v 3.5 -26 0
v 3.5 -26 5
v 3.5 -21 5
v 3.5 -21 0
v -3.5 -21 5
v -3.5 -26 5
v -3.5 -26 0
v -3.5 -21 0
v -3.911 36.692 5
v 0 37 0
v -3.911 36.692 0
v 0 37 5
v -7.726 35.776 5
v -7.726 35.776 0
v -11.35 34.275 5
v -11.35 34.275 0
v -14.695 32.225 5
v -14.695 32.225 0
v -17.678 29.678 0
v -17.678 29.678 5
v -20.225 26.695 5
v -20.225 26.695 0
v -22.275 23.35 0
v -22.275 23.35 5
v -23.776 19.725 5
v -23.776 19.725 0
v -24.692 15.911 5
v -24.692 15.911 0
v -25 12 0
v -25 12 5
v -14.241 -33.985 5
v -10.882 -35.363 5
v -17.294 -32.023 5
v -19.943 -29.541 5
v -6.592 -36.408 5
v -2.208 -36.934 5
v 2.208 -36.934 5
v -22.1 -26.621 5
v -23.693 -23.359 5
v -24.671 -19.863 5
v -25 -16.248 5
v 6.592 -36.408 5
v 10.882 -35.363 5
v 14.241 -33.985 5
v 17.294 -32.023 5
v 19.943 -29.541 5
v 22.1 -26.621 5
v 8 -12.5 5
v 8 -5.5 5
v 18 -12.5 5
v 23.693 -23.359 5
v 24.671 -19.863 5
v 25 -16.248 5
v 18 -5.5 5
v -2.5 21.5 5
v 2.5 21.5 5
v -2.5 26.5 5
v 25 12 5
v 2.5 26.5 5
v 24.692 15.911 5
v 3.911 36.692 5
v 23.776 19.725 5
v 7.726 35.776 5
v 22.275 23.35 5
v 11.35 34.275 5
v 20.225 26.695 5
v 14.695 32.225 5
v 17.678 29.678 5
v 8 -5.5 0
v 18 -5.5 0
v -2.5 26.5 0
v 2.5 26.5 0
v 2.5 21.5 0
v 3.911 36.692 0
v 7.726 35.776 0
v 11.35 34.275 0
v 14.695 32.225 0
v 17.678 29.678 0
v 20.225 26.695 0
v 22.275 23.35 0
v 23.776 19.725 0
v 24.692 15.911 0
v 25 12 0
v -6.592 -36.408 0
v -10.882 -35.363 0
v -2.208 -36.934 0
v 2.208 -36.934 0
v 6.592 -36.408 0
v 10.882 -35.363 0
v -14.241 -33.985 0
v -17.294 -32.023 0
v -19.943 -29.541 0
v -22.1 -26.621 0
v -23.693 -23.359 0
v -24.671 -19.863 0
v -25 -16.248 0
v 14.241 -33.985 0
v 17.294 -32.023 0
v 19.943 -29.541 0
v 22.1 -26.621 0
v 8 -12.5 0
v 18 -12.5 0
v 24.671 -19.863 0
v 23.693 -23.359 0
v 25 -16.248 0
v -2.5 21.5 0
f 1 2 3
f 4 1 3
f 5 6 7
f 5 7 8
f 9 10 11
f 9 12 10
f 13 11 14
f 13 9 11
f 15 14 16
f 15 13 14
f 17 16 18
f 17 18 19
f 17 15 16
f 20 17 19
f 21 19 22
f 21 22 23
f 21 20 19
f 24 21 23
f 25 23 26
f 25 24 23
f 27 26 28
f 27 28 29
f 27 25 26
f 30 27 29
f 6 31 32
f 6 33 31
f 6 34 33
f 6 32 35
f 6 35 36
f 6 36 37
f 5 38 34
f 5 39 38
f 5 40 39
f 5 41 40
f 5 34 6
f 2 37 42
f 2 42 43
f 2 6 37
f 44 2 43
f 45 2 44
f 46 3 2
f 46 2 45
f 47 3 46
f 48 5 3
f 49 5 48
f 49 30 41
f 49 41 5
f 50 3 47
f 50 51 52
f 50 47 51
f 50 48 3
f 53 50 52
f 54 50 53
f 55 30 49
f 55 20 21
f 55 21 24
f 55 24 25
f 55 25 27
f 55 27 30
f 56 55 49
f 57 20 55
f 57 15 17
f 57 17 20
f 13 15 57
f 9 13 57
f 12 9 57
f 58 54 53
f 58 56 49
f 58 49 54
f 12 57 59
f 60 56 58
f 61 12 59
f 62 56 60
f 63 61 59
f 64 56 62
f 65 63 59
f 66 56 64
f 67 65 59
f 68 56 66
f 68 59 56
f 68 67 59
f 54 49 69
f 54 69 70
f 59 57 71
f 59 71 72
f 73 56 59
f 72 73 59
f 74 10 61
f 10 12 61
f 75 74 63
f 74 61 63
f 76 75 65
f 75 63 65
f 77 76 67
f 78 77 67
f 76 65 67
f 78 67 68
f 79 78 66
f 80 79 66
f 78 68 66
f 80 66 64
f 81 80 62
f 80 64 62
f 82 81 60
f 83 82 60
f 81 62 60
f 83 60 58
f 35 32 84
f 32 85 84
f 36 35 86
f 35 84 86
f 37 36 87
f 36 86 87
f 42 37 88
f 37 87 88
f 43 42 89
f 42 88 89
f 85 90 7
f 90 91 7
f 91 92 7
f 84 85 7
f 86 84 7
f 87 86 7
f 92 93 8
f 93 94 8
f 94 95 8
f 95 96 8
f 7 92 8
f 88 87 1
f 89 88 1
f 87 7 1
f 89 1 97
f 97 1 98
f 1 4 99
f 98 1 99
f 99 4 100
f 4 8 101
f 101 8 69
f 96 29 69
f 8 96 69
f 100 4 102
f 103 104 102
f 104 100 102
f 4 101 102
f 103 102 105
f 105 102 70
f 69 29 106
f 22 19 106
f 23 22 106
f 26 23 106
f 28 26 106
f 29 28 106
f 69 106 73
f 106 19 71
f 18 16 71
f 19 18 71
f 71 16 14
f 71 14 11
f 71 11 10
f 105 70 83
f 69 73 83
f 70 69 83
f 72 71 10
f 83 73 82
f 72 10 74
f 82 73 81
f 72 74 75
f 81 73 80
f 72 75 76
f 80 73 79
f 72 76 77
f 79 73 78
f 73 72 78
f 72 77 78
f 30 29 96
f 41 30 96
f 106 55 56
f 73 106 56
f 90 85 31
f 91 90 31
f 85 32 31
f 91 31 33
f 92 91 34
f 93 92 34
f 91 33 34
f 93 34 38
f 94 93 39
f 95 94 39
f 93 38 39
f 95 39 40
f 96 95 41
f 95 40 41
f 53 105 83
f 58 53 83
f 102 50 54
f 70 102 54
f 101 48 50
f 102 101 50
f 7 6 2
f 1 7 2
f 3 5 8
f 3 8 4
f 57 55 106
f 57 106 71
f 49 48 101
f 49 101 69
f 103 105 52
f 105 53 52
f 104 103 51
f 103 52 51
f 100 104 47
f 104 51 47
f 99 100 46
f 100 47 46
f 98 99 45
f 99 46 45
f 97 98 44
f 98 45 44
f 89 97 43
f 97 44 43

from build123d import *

# Parameters (mm, degrees)
SKETCH1_R           = 37
BOSS_EXTRUDE1_DEPTH = 5
CUT_EXTRUDE3_START  = -10
CUT_EXTRUDE3_DEPTH  = 10
FILLET2_R           = 25
FILLET3_R           = 20
SKETCH7_W           = 5
SKETCH7_H           = 5
SKETCH7_W_2         = 7
CUT_EXTRUDE4_DEPTH  = 10
SKETCH8_W           = 10
SKETCH8_H           = 7
CUT_EXTRUDE5_DEPTH  = 10


with BuildPart() as part:
    # Sketch1 → Boss-Extrude1 (new body)
    with BuildSketch(Plane.XY):
        Circle(SKETCH1_R)
    extrude(amount=BOSS_EXTRUDE1_DEPTH)

    # Sketch6 → Cut-Extrude3 (cut)
    with BuildSketch(Plane.XY.offset(5).offset(CUT_EXTRUDE3_START)):
        with BuildLine():
            Line((-25, 27.276363394), (-25, -27.276363394))
            ThreePointArc((-25, -27.276363394), (-37, 0), (-25, 27.276363394))
        make_face()
        with BuildLine():
            Line((25, -27.276363394), (25, 27.276363394))
            ThreePointArc((25, 27.276363394), (37, 0), (25, -27.276363394))
        make_face()
    extrude(amount=CUT_EXTRUDE3_DEPTH, mode=Mode.SUBTRACT)

    # Fillet2
    fillet2_edges = [part.edges().sort_by_distance(p)[0] for p in [
        (-25, 27.276363394, 2.5),
        (25, 27.276363394, 2.5),
    ]]
    fillet(fillet2_edges, radius=FILLET2_R - 0.0001)  # a hair under: the kernel refuses the full size

    # Fillet3
    fillet3_edges = [part.edges().sort_by_distance(p)[0] for p in [
        (-25, -27.276363394, 2.5),
        (25, -27.276363394, 2.5),
    ]]
    fillet(fillet3_edges, radius=FILLET3_R)

    # Sketch7 → Cut-Extrude4 (cut)
    with BuildSketch(Plane.XY.offset(5)):
        with Locations((0, 24)):
            Rectangle(SKETCH7_W, SKETCH7_H)
        with Locations((0, -23.5)):
            Rectangle(SKETCH7_W_2, SKETCH7_H)
    extrude(amount=-CUT_EXTRUDE4_DEPTH, mode=Mode.SUBTRACT)

    # Sketch8 → Cut-Extrude5 (cut)
    with BuildSketch(Plane.XY.offset(5)):
        with Locations((13, -9)):
            Rectangle(SKETCH8_W, SKETCH8_H)
    extrude(amount=-CUT_EXTRUDE5_DEPTH, mode=Mode.SUBTRACT)


solid = part.part
